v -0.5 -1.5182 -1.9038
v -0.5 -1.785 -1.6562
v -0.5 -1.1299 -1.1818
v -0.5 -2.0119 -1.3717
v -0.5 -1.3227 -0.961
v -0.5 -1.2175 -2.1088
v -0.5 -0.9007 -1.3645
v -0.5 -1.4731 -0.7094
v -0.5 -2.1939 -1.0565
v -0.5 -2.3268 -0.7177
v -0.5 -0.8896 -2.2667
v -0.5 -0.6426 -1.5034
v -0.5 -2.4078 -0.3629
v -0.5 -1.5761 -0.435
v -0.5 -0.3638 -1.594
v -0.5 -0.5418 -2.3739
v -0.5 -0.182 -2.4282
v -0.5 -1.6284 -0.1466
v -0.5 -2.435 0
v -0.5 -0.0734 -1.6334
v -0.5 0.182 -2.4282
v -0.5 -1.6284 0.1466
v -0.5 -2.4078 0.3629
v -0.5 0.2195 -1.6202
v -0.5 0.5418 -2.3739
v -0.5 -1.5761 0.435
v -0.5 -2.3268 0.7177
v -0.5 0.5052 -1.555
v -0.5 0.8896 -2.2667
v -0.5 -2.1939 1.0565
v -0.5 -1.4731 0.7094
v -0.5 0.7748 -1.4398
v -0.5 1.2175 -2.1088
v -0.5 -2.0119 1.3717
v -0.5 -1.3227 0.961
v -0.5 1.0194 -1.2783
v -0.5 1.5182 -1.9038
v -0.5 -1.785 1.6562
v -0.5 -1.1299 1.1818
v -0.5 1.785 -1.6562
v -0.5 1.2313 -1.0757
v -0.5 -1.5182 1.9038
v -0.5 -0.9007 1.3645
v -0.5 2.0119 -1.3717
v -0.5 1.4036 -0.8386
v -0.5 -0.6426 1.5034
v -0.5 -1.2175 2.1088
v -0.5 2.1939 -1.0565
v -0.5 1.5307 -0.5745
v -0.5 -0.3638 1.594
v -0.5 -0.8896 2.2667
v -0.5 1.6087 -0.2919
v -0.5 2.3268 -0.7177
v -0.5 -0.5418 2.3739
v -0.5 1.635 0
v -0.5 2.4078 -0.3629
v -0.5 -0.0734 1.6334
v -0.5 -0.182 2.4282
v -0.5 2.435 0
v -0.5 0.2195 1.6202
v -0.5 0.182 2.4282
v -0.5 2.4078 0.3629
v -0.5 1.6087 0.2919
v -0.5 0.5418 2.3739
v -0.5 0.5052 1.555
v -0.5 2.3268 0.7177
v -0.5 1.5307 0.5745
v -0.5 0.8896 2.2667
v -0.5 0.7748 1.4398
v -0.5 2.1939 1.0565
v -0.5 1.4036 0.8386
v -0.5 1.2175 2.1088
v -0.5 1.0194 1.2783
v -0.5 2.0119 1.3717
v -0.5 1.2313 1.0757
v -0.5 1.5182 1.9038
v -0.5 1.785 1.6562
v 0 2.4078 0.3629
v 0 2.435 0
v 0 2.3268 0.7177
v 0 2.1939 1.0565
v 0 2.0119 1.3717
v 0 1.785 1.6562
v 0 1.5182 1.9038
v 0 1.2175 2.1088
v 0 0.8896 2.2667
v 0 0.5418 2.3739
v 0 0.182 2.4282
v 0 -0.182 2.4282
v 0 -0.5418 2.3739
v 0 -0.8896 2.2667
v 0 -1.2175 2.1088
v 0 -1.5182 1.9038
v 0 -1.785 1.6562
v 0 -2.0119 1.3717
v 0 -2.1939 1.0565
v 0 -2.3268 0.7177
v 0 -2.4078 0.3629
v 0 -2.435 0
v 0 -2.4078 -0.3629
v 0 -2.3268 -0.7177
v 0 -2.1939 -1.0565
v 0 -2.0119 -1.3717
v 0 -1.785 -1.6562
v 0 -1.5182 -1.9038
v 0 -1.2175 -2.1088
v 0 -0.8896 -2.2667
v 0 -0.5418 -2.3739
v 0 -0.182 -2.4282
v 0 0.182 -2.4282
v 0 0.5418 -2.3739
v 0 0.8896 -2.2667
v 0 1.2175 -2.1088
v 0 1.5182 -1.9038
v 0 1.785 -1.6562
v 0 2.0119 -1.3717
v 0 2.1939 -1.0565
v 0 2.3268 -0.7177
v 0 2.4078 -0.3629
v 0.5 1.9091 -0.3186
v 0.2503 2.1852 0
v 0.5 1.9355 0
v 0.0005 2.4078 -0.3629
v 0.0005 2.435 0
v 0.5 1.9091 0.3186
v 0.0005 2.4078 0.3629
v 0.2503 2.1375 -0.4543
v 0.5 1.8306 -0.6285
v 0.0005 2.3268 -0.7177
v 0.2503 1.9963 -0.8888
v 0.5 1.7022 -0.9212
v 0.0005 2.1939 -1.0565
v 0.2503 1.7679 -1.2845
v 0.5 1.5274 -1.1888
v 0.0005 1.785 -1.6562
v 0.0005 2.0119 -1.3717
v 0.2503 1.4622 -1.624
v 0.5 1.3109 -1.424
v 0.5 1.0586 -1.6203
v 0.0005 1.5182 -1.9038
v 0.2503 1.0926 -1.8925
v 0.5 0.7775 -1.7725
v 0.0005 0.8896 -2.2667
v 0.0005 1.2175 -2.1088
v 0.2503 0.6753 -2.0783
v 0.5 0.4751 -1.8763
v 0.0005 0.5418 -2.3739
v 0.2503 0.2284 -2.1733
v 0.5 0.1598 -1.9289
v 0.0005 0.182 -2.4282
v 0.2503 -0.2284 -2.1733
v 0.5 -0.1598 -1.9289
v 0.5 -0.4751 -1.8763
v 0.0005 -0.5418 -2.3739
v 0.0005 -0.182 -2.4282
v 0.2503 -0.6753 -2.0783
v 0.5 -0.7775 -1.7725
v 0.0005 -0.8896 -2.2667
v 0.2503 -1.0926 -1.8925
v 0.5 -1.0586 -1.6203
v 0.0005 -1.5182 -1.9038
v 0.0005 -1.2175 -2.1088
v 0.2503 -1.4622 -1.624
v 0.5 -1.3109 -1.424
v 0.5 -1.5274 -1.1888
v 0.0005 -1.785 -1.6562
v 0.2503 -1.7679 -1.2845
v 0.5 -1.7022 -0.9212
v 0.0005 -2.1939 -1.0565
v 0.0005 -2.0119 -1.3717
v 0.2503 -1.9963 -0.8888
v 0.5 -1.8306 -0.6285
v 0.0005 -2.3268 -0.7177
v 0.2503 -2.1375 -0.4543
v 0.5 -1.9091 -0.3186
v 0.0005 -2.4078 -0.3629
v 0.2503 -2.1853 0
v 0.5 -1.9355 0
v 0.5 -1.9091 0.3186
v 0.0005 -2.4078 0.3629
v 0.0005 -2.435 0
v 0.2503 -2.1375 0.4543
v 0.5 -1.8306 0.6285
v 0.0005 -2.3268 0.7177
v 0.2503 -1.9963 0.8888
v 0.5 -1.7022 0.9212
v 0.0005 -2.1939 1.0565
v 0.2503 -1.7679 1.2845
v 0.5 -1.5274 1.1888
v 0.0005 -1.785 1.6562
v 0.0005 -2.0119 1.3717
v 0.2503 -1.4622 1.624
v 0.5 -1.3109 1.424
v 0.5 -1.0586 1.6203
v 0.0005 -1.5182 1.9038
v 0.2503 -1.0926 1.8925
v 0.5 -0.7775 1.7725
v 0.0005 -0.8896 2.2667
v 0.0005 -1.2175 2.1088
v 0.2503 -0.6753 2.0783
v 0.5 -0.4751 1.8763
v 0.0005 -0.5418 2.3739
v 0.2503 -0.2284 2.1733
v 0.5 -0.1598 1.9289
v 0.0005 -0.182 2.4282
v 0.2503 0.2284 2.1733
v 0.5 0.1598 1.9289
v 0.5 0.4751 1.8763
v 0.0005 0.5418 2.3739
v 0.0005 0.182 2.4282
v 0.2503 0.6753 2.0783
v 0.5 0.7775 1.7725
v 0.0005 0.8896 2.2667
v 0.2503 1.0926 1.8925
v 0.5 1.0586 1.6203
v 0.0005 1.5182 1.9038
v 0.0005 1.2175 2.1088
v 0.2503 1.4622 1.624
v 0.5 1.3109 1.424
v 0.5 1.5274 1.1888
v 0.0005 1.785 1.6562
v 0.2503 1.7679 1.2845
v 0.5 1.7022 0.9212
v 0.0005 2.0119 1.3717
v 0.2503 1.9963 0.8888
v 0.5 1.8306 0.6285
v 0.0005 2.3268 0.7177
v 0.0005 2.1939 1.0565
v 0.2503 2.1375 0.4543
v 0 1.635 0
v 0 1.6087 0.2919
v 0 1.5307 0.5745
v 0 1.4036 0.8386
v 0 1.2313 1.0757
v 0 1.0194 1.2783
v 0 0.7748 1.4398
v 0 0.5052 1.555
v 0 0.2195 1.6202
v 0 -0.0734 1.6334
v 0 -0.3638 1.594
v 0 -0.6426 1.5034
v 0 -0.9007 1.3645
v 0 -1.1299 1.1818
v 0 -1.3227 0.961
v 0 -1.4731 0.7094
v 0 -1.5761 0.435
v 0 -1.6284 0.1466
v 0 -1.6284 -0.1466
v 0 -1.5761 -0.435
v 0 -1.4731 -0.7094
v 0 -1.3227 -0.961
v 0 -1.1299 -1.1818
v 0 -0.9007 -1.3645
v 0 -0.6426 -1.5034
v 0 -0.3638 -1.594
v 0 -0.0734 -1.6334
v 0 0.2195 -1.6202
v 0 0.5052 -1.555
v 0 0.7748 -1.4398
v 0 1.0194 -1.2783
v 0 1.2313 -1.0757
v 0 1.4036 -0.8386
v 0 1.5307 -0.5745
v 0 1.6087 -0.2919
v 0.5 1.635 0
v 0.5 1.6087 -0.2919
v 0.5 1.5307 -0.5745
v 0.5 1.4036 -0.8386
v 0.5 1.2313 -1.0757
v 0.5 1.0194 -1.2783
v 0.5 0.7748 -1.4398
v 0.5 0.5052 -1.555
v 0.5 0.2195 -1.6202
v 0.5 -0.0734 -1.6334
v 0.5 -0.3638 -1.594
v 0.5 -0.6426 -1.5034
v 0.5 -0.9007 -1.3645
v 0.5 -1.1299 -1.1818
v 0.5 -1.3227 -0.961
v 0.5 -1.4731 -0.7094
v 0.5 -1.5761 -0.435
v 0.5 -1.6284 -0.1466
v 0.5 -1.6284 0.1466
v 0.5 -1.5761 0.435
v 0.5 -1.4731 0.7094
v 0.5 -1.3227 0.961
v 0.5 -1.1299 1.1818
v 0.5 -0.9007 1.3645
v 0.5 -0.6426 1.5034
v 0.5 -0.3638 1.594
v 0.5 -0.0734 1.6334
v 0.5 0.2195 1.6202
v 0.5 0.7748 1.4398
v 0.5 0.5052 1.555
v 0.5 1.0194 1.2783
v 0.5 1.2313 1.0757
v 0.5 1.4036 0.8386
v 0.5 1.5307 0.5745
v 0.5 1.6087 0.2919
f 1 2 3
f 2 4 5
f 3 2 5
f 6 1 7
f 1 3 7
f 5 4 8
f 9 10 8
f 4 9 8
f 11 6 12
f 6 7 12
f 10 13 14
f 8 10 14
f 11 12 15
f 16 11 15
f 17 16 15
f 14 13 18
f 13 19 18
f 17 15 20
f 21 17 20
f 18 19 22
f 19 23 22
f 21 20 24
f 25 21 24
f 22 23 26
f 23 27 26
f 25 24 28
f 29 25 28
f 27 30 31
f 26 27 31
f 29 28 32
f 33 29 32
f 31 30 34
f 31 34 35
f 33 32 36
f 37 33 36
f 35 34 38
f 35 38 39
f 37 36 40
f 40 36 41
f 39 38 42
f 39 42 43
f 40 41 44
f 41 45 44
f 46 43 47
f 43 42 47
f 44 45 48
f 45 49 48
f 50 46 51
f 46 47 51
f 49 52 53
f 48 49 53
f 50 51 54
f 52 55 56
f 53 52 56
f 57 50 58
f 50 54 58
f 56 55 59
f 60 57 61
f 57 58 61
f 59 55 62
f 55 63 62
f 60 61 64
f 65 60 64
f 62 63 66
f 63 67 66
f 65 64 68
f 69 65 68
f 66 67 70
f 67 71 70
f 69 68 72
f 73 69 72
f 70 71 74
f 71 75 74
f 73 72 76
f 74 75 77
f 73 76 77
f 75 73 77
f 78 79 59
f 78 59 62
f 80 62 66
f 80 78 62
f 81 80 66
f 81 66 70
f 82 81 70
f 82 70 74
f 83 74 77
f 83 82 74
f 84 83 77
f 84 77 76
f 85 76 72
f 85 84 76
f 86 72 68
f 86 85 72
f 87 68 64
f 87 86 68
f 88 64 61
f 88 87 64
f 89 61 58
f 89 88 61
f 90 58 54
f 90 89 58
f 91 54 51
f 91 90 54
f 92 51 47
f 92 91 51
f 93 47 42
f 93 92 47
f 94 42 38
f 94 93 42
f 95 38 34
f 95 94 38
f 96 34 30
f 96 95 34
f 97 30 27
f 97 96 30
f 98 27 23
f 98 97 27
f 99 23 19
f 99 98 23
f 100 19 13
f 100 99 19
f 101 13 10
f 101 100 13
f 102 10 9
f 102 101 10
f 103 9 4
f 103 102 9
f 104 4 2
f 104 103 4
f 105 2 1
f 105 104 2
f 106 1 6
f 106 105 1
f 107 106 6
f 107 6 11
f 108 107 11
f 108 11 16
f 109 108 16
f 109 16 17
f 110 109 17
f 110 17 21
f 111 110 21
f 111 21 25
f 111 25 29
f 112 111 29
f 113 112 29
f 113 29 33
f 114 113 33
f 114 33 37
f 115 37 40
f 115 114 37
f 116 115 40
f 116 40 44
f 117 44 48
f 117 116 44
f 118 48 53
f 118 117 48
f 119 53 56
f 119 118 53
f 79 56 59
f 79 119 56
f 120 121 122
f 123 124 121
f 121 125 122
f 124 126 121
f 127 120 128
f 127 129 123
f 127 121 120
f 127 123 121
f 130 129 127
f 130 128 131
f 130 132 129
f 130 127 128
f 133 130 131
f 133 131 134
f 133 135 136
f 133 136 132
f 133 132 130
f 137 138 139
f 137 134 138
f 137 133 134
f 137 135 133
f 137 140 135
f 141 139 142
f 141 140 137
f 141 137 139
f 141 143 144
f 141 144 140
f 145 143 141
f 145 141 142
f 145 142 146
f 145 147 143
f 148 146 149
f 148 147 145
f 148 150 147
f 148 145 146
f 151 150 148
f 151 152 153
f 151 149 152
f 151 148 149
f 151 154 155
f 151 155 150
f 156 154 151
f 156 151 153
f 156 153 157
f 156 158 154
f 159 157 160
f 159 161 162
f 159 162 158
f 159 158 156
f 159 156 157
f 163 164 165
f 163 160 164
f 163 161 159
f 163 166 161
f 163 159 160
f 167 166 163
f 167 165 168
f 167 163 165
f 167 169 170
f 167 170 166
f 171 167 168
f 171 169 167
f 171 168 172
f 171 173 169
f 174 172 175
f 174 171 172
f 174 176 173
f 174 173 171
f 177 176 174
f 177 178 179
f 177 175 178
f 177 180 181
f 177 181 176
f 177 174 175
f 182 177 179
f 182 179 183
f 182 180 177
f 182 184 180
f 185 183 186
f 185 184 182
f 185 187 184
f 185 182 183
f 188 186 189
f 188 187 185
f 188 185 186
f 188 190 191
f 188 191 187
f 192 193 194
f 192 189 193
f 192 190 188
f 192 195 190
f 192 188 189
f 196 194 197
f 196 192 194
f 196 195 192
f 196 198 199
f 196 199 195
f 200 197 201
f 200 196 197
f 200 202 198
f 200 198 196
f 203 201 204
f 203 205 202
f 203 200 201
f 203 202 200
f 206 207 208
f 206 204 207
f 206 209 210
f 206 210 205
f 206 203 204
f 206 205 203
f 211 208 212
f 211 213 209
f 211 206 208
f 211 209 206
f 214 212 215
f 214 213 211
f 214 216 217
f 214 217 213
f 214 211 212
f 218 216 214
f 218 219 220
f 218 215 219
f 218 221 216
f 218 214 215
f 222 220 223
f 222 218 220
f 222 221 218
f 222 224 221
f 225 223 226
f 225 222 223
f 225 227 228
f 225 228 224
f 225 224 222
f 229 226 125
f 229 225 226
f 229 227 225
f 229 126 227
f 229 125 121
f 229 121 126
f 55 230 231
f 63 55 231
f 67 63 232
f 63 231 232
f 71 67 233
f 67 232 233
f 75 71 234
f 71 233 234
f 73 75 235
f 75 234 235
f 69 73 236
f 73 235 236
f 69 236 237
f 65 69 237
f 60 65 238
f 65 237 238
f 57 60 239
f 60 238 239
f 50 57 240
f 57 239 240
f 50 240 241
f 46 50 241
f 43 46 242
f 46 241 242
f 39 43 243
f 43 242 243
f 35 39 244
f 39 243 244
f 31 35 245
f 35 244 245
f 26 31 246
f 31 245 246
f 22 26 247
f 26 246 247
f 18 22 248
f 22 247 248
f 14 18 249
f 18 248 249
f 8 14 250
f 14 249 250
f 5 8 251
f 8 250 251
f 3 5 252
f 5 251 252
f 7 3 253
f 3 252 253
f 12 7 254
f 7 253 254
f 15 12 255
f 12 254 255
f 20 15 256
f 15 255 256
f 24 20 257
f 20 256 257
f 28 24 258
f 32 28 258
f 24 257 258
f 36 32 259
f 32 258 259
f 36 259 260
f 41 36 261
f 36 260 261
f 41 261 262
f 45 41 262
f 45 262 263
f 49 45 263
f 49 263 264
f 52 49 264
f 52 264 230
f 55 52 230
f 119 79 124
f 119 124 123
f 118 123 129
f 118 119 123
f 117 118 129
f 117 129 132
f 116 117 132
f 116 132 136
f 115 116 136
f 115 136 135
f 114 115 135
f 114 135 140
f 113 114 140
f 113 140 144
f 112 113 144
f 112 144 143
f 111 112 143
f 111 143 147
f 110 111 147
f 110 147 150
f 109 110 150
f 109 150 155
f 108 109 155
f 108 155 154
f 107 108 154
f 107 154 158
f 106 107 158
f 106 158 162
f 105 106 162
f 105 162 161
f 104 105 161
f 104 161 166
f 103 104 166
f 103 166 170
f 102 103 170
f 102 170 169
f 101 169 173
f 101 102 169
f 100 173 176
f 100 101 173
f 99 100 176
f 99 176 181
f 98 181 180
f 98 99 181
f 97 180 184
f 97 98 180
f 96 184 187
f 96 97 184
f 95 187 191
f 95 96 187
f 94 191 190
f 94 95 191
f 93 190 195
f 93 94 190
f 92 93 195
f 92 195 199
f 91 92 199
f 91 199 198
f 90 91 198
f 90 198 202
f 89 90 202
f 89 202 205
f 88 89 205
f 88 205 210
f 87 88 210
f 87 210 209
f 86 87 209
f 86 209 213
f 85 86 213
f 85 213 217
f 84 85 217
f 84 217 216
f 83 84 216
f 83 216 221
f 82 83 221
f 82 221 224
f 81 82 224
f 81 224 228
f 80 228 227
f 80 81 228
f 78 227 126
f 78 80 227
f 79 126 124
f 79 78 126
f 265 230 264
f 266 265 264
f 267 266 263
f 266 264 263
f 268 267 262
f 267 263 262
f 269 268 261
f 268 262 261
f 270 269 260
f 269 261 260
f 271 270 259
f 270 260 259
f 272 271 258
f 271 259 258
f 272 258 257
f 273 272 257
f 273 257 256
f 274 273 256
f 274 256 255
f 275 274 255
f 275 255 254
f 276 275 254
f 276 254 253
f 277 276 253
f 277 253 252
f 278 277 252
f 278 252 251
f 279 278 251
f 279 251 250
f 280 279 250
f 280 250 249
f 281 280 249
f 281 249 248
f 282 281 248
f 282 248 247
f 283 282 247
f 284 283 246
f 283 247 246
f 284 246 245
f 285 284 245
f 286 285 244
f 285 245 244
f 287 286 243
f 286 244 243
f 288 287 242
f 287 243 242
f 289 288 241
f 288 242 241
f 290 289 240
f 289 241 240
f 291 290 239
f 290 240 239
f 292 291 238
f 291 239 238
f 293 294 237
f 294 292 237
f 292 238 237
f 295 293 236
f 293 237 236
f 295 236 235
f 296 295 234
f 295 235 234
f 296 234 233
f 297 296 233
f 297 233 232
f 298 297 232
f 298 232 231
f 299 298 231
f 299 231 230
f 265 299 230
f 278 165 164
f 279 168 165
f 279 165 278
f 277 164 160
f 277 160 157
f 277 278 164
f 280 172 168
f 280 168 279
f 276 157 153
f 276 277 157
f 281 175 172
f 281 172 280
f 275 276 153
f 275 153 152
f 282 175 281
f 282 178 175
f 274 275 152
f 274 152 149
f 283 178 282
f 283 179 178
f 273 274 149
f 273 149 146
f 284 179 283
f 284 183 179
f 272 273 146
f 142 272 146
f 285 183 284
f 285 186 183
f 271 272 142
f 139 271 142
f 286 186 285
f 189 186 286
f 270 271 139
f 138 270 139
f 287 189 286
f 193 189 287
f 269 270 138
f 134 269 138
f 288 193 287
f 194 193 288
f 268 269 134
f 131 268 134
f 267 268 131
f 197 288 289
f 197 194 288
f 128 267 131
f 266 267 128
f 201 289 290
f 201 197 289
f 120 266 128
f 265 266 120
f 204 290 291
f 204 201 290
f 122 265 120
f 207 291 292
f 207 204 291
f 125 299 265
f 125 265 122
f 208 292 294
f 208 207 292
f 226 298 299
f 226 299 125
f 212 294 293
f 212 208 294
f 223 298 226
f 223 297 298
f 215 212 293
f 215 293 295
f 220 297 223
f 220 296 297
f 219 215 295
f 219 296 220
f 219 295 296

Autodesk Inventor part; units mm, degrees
ref_plane "YZ Plane" through (0, 0, 0) normal (1, 0, 0) x (0, 1, 0)
ref_plane "XZ Plane" through (0, 0, 0) normal (0, 1, 0) x (-1, 0, 0)
ref_plane "XY Plane" through (0, 0, 0) normal (0, 0, 1) x (1, 0, 0)
sketch "スケッチ1" plane through (0, 0, 0) normal (1, 0, 0) x (0, 1, 0)
  circle A0 centre (0, 0) radius 2.435
  circle A1 centre (0, 0) radius 1.635
  dimension "d0" = 3.27
  dimension "d1" = 0.8
extrude "押し出し1" add sketch "スケッチ1" along normal mid plane 1
chamfer "面取り2" distance 0.5 angle 45 1 edges at (0.5, -2.435, 0)
properties part number "spacer_Φ3.2_1"
